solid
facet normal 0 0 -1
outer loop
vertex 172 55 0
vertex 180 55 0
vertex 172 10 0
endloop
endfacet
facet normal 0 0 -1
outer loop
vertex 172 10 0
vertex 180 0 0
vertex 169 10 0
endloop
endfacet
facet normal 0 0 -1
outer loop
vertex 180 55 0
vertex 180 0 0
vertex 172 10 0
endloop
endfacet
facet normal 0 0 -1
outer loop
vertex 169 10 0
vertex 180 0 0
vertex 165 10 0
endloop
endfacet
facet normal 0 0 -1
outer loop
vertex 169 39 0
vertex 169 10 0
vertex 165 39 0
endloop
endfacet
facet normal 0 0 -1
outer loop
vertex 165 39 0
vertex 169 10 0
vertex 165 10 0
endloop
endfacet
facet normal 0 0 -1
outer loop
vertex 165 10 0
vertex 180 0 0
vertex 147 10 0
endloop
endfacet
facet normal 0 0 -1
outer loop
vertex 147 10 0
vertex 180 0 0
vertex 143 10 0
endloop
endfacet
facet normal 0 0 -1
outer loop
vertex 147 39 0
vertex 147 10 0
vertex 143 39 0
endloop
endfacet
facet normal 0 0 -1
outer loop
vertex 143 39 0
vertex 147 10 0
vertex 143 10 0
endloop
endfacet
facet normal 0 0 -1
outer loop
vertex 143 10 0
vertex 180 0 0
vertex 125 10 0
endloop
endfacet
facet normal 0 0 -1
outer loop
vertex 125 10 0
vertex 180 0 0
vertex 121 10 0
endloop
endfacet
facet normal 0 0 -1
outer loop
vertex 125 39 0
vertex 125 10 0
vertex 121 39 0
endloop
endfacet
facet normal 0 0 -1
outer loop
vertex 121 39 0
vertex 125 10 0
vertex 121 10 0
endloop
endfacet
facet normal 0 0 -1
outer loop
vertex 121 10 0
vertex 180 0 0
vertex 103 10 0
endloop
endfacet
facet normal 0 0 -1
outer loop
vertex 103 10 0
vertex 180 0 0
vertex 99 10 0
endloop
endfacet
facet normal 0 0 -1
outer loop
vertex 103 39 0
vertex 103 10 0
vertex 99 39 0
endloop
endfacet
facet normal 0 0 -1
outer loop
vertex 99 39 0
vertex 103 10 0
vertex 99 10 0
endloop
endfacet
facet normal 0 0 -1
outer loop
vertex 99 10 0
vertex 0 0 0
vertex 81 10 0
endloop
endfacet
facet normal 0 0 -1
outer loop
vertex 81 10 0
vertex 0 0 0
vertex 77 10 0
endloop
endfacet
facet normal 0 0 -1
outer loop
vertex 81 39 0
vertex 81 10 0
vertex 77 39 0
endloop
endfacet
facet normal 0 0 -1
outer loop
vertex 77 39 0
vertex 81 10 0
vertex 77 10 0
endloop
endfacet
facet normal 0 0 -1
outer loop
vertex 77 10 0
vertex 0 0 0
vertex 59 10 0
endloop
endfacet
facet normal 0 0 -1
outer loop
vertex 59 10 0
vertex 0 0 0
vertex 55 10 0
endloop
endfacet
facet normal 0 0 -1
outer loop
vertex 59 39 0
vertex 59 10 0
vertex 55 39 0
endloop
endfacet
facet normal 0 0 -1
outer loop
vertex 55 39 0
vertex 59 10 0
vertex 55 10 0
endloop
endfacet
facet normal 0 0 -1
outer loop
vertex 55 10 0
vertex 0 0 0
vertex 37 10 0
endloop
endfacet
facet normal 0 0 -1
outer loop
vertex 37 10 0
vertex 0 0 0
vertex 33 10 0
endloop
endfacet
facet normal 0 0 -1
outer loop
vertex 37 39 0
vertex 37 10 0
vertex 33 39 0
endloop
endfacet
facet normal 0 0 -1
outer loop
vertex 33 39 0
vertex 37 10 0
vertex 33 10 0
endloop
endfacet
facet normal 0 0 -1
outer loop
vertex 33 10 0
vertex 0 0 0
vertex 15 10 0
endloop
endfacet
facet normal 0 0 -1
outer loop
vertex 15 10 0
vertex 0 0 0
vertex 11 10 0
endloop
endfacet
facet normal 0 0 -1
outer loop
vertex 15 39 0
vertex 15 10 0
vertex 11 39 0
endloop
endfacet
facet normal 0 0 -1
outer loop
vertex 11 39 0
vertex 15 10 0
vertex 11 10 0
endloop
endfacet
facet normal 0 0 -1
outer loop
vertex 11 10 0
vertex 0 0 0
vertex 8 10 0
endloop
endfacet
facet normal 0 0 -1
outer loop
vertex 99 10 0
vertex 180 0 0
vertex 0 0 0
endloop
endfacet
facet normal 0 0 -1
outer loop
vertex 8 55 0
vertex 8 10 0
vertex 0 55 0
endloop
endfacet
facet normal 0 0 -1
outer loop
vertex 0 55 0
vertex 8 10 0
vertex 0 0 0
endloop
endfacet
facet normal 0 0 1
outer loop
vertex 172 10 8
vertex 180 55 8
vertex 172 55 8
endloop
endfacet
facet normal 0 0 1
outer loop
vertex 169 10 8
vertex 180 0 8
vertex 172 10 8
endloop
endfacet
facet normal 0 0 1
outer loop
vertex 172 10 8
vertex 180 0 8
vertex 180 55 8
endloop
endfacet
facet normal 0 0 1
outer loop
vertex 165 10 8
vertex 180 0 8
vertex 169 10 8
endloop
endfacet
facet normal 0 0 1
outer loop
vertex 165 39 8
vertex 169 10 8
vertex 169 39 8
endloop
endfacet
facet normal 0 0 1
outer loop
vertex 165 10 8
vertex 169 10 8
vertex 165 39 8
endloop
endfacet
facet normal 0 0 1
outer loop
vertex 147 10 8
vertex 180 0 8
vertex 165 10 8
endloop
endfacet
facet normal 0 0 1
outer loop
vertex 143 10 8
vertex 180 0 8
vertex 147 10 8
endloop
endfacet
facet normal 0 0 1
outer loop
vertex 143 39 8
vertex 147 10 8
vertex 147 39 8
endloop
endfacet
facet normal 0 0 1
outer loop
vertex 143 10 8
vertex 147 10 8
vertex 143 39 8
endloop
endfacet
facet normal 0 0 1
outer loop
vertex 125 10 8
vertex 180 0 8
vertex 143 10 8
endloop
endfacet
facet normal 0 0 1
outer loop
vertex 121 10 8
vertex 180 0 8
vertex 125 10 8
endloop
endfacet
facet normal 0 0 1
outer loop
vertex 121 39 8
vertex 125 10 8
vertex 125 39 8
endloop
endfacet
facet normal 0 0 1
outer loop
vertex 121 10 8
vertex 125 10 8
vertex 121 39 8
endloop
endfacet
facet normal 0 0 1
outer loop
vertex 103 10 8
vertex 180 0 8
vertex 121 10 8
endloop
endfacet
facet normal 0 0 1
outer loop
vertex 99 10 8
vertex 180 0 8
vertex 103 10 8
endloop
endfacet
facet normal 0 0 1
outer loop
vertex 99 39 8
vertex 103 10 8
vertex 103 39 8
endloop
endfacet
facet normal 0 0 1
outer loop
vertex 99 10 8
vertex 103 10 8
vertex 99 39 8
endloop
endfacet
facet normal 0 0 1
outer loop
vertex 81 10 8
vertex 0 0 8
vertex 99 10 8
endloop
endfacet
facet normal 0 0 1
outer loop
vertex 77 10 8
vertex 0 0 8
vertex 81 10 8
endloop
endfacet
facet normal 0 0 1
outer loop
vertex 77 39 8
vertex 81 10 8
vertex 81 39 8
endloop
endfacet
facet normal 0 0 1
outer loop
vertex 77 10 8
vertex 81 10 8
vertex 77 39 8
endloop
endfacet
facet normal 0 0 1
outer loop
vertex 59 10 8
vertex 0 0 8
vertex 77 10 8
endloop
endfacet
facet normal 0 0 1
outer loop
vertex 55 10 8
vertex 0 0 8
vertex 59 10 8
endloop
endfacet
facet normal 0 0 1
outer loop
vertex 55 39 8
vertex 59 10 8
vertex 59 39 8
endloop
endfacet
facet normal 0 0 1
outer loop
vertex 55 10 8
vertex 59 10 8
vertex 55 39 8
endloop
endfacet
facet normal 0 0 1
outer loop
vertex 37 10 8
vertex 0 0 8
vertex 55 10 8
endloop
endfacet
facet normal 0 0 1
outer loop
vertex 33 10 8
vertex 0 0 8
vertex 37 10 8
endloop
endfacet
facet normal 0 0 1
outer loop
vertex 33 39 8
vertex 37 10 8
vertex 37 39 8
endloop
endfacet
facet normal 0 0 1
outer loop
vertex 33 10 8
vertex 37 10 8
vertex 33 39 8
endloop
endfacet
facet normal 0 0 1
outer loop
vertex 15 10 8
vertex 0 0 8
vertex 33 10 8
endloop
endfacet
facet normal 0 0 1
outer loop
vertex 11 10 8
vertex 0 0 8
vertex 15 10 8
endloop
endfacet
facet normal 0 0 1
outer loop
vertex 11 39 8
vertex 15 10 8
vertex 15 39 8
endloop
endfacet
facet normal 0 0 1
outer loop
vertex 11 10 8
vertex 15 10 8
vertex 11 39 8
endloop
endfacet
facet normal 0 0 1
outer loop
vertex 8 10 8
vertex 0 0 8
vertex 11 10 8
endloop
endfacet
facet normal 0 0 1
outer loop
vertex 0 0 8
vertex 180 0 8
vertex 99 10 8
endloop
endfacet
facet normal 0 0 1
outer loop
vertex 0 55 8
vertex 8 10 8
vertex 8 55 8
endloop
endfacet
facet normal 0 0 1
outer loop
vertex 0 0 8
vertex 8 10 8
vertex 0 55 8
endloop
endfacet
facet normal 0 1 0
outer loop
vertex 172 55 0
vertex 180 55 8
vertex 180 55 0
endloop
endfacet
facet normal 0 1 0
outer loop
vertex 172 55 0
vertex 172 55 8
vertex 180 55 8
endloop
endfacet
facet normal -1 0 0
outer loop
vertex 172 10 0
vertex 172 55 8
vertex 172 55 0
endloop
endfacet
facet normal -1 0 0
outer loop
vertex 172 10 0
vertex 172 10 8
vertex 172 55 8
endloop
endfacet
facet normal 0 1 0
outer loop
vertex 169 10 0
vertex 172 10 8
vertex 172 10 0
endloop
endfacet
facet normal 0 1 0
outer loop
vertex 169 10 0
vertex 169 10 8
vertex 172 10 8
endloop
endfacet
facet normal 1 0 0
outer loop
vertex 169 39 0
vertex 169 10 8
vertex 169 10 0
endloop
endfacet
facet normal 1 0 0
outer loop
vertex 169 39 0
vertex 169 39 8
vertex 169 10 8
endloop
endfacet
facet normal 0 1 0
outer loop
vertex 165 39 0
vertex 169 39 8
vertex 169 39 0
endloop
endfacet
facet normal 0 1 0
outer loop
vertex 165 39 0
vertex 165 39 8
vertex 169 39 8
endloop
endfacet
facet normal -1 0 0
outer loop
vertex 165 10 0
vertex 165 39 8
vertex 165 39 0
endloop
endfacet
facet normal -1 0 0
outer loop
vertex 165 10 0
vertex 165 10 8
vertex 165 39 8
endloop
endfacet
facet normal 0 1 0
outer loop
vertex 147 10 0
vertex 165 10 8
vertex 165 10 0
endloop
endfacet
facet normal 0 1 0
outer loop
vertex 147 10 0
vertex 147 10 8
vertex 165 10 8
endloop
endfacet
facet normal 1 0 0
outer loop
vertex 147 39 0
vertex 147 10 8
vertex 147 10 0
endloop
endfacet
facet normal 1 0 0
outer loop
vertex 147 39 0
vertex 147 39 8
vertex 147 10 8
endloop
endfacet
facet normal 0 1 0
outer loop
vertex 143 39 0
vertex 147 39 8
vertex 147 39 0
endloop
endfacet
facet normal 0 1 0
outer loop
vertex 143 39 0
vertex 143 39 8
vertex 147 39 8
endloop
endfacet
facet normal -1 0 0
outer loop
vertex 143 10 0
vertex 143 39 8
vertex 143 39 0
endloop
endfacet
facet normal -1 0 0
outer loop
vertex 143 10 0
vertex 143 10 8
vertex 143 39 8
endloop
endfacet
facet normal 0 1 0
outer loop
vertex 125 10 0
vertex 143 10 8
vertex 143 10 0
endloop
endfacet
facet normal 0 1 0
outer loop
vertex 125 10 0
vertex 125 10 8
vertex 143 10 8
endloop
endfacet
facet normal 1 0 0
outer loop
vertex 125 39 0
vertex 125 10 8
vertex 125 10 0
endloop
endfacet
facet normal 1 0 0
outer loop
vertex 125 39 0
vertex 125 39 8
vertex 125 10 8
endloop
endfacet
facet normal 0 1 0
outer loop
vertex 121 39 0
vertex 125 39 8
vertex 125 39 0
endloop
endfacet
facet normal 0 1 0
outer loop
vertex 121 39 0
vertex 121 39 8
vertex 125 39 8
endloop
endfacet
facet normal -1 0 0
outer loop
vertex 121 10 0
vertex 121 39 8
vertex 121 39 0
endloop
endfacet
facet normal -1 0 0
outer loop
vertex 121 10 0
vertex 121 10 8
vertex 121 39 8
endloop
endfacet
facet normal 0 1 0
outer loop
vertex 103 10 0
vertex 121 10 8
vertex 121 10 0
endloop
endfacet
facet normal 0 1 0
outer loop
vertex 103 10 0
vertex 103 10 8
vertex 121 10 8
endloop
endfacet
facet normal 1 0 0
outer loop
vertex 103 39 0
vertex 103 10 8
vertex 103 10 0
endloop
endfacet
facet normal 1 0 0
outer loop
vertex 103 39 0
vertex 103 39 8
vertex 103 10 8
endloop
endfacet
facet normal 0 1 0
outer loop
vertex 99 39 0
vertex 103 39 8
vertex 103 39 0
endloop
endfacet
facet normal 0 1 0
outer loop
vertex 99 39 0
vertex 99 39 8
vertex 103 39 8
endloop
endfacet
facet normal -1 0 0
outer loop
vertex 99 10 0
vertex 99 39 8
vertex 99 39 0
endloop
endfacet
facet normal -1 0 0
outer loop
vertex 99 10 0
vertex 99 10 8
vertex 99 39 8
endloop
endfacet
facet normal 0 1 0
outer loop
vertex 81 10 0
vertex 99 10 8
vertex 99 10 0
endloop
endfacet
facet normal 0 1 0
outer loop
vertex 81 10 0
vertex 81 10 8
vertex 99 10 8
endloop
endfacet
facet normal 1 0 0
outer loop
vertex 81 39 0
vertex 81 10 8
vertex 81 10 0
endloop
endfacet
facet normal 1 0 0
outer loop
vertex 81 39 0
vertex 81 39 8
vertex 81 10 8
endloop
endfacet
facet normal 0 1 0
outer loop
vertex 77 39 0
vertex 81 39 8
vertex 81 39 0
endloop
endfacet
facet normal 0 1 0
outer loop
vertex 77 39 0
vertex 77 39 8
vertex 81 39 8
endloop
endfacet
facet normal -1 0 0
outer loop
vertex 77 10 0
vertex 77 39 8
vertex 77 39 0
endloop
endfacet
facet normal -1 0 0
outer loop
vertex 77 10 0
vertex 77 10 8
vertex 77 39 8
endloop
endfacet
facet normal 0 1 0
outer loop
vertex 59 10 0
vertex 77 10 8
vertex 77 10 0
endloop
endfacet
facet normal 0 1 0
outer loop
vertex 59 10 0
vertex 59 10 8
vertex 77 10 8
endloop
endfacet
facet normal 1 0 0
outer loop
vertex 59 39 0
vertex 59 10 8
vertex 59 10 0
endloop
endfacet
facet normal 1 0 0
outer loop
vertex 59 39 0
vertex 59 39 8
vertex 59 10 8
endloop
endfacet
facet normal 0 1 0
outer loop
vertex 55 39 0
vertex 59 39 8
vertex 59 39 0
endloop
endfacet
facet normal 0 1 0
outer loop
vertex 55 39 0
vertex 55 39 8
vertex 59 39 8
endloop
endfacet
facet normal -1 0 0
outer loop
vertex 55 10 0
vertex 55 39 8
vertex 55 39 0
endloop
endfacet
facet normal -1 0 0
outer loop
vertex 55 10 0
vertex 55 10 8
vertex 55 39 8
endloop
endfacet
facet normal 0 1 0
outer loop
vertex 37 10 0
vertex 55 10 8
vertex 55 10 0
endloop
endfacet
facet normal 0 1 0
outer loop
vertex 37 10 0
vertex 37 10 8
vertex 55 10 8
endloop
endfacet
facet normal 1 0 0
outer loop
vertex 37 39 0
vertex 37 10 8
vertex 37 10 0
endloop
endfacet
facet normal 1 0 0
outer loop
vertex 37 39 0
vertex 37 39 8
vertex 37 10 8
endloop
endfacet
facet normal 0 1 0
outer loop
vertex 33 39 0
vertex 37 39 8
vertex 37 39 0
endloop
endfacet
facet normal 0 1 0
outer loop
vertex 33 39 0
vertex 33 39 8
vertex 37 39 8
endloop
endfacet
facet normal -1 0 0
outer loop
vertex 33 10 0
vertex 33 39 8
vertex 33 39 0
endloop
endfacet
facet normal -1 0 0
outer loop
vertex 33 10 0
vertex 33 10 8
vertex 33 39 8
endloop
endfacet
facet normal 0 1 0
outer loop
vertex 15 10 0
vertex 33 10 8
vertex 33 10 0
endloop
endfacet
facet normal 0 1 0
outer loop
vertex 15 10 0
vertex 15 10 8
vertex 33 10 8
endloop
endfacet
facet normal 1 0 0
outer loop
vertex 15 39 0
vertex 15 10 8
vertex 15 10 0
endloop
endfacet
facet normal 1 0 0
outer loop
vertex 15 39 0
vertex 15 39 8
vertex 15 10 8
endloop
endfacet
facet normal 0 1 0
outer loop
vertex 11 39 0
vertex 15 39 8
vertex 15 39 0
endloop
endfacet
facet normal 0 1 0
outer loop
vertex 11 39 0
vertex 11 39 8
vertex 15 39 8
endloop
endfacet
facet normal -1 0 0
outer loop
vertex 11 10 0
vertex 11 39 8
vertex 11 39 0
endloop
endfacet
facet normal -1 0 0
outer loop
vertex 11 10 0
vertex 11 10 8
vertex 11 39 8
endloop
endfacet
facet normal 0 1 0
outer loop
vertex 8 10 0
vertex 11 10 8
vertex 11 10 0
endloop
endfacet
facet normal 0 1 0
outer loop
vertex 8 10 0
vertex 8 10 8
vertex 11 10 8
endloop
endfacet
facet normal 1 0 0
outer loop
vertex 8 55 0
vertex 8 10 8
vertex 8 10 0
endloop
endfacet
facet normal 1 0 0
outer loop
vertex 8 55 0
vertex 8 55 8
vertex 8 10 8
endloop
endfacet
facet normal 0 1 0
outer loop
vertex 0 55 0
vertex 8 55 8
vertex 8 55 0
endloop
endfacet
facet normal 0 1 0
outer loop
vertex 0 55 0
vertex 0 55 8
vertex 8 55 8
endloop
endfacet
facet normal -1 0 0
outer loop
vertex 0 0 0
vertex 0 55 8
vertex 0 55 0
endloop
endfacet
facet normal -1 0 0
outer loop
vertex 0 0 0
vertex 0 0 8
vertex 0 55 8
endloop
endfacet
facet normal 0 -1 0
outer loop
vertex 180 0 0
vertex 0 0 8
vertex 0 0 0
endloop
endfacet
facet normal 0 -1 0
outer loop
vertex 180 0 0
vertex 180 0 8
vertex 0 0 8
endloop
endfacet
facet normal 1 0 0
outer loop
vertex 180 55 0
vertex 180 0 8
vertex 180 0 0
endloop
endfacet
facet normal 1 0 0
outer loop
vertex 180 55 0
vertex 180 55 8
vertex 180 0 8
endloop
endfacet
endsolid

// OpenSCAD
$fn = 32;

// ----------------------------------------------------------------------
// Guard grille: 8 slats over a 180 x 55 mm plate
// ----------------------------------------------------------------------

// --- parameters (mm) ---
profile_height = 8;       // extrusion height
profile_points = 40;      // points of the closed outline

profile = [[0, 0], [180, 0], [180, 55], [172, 55], [172, 10], [169, 10], [169, 39], [165, 39], [165, 10], [147, 10], [147, 39], [143, 39], [143, 10], [125, 10], [125, 39], [121, 39], [121, 10], [103, 10], [103, 39], [99, 39], [99, 10], [81, 10], [81, 39], [77, 39], [77, 10], [59, 10], [59, 39], [55, 39], [55, 10], [37, 10], [37, 39], [33, 39], [33, 10], [15, 10], [15, 39], [11, 39], [11, 10], [8, 10], [8, 55], [0, 55]];  // single closed polygon, 40 points, counter clockwise

// --- the one profile operation ---
linear_extrude(height = profile_height) polygon(points = profile);
